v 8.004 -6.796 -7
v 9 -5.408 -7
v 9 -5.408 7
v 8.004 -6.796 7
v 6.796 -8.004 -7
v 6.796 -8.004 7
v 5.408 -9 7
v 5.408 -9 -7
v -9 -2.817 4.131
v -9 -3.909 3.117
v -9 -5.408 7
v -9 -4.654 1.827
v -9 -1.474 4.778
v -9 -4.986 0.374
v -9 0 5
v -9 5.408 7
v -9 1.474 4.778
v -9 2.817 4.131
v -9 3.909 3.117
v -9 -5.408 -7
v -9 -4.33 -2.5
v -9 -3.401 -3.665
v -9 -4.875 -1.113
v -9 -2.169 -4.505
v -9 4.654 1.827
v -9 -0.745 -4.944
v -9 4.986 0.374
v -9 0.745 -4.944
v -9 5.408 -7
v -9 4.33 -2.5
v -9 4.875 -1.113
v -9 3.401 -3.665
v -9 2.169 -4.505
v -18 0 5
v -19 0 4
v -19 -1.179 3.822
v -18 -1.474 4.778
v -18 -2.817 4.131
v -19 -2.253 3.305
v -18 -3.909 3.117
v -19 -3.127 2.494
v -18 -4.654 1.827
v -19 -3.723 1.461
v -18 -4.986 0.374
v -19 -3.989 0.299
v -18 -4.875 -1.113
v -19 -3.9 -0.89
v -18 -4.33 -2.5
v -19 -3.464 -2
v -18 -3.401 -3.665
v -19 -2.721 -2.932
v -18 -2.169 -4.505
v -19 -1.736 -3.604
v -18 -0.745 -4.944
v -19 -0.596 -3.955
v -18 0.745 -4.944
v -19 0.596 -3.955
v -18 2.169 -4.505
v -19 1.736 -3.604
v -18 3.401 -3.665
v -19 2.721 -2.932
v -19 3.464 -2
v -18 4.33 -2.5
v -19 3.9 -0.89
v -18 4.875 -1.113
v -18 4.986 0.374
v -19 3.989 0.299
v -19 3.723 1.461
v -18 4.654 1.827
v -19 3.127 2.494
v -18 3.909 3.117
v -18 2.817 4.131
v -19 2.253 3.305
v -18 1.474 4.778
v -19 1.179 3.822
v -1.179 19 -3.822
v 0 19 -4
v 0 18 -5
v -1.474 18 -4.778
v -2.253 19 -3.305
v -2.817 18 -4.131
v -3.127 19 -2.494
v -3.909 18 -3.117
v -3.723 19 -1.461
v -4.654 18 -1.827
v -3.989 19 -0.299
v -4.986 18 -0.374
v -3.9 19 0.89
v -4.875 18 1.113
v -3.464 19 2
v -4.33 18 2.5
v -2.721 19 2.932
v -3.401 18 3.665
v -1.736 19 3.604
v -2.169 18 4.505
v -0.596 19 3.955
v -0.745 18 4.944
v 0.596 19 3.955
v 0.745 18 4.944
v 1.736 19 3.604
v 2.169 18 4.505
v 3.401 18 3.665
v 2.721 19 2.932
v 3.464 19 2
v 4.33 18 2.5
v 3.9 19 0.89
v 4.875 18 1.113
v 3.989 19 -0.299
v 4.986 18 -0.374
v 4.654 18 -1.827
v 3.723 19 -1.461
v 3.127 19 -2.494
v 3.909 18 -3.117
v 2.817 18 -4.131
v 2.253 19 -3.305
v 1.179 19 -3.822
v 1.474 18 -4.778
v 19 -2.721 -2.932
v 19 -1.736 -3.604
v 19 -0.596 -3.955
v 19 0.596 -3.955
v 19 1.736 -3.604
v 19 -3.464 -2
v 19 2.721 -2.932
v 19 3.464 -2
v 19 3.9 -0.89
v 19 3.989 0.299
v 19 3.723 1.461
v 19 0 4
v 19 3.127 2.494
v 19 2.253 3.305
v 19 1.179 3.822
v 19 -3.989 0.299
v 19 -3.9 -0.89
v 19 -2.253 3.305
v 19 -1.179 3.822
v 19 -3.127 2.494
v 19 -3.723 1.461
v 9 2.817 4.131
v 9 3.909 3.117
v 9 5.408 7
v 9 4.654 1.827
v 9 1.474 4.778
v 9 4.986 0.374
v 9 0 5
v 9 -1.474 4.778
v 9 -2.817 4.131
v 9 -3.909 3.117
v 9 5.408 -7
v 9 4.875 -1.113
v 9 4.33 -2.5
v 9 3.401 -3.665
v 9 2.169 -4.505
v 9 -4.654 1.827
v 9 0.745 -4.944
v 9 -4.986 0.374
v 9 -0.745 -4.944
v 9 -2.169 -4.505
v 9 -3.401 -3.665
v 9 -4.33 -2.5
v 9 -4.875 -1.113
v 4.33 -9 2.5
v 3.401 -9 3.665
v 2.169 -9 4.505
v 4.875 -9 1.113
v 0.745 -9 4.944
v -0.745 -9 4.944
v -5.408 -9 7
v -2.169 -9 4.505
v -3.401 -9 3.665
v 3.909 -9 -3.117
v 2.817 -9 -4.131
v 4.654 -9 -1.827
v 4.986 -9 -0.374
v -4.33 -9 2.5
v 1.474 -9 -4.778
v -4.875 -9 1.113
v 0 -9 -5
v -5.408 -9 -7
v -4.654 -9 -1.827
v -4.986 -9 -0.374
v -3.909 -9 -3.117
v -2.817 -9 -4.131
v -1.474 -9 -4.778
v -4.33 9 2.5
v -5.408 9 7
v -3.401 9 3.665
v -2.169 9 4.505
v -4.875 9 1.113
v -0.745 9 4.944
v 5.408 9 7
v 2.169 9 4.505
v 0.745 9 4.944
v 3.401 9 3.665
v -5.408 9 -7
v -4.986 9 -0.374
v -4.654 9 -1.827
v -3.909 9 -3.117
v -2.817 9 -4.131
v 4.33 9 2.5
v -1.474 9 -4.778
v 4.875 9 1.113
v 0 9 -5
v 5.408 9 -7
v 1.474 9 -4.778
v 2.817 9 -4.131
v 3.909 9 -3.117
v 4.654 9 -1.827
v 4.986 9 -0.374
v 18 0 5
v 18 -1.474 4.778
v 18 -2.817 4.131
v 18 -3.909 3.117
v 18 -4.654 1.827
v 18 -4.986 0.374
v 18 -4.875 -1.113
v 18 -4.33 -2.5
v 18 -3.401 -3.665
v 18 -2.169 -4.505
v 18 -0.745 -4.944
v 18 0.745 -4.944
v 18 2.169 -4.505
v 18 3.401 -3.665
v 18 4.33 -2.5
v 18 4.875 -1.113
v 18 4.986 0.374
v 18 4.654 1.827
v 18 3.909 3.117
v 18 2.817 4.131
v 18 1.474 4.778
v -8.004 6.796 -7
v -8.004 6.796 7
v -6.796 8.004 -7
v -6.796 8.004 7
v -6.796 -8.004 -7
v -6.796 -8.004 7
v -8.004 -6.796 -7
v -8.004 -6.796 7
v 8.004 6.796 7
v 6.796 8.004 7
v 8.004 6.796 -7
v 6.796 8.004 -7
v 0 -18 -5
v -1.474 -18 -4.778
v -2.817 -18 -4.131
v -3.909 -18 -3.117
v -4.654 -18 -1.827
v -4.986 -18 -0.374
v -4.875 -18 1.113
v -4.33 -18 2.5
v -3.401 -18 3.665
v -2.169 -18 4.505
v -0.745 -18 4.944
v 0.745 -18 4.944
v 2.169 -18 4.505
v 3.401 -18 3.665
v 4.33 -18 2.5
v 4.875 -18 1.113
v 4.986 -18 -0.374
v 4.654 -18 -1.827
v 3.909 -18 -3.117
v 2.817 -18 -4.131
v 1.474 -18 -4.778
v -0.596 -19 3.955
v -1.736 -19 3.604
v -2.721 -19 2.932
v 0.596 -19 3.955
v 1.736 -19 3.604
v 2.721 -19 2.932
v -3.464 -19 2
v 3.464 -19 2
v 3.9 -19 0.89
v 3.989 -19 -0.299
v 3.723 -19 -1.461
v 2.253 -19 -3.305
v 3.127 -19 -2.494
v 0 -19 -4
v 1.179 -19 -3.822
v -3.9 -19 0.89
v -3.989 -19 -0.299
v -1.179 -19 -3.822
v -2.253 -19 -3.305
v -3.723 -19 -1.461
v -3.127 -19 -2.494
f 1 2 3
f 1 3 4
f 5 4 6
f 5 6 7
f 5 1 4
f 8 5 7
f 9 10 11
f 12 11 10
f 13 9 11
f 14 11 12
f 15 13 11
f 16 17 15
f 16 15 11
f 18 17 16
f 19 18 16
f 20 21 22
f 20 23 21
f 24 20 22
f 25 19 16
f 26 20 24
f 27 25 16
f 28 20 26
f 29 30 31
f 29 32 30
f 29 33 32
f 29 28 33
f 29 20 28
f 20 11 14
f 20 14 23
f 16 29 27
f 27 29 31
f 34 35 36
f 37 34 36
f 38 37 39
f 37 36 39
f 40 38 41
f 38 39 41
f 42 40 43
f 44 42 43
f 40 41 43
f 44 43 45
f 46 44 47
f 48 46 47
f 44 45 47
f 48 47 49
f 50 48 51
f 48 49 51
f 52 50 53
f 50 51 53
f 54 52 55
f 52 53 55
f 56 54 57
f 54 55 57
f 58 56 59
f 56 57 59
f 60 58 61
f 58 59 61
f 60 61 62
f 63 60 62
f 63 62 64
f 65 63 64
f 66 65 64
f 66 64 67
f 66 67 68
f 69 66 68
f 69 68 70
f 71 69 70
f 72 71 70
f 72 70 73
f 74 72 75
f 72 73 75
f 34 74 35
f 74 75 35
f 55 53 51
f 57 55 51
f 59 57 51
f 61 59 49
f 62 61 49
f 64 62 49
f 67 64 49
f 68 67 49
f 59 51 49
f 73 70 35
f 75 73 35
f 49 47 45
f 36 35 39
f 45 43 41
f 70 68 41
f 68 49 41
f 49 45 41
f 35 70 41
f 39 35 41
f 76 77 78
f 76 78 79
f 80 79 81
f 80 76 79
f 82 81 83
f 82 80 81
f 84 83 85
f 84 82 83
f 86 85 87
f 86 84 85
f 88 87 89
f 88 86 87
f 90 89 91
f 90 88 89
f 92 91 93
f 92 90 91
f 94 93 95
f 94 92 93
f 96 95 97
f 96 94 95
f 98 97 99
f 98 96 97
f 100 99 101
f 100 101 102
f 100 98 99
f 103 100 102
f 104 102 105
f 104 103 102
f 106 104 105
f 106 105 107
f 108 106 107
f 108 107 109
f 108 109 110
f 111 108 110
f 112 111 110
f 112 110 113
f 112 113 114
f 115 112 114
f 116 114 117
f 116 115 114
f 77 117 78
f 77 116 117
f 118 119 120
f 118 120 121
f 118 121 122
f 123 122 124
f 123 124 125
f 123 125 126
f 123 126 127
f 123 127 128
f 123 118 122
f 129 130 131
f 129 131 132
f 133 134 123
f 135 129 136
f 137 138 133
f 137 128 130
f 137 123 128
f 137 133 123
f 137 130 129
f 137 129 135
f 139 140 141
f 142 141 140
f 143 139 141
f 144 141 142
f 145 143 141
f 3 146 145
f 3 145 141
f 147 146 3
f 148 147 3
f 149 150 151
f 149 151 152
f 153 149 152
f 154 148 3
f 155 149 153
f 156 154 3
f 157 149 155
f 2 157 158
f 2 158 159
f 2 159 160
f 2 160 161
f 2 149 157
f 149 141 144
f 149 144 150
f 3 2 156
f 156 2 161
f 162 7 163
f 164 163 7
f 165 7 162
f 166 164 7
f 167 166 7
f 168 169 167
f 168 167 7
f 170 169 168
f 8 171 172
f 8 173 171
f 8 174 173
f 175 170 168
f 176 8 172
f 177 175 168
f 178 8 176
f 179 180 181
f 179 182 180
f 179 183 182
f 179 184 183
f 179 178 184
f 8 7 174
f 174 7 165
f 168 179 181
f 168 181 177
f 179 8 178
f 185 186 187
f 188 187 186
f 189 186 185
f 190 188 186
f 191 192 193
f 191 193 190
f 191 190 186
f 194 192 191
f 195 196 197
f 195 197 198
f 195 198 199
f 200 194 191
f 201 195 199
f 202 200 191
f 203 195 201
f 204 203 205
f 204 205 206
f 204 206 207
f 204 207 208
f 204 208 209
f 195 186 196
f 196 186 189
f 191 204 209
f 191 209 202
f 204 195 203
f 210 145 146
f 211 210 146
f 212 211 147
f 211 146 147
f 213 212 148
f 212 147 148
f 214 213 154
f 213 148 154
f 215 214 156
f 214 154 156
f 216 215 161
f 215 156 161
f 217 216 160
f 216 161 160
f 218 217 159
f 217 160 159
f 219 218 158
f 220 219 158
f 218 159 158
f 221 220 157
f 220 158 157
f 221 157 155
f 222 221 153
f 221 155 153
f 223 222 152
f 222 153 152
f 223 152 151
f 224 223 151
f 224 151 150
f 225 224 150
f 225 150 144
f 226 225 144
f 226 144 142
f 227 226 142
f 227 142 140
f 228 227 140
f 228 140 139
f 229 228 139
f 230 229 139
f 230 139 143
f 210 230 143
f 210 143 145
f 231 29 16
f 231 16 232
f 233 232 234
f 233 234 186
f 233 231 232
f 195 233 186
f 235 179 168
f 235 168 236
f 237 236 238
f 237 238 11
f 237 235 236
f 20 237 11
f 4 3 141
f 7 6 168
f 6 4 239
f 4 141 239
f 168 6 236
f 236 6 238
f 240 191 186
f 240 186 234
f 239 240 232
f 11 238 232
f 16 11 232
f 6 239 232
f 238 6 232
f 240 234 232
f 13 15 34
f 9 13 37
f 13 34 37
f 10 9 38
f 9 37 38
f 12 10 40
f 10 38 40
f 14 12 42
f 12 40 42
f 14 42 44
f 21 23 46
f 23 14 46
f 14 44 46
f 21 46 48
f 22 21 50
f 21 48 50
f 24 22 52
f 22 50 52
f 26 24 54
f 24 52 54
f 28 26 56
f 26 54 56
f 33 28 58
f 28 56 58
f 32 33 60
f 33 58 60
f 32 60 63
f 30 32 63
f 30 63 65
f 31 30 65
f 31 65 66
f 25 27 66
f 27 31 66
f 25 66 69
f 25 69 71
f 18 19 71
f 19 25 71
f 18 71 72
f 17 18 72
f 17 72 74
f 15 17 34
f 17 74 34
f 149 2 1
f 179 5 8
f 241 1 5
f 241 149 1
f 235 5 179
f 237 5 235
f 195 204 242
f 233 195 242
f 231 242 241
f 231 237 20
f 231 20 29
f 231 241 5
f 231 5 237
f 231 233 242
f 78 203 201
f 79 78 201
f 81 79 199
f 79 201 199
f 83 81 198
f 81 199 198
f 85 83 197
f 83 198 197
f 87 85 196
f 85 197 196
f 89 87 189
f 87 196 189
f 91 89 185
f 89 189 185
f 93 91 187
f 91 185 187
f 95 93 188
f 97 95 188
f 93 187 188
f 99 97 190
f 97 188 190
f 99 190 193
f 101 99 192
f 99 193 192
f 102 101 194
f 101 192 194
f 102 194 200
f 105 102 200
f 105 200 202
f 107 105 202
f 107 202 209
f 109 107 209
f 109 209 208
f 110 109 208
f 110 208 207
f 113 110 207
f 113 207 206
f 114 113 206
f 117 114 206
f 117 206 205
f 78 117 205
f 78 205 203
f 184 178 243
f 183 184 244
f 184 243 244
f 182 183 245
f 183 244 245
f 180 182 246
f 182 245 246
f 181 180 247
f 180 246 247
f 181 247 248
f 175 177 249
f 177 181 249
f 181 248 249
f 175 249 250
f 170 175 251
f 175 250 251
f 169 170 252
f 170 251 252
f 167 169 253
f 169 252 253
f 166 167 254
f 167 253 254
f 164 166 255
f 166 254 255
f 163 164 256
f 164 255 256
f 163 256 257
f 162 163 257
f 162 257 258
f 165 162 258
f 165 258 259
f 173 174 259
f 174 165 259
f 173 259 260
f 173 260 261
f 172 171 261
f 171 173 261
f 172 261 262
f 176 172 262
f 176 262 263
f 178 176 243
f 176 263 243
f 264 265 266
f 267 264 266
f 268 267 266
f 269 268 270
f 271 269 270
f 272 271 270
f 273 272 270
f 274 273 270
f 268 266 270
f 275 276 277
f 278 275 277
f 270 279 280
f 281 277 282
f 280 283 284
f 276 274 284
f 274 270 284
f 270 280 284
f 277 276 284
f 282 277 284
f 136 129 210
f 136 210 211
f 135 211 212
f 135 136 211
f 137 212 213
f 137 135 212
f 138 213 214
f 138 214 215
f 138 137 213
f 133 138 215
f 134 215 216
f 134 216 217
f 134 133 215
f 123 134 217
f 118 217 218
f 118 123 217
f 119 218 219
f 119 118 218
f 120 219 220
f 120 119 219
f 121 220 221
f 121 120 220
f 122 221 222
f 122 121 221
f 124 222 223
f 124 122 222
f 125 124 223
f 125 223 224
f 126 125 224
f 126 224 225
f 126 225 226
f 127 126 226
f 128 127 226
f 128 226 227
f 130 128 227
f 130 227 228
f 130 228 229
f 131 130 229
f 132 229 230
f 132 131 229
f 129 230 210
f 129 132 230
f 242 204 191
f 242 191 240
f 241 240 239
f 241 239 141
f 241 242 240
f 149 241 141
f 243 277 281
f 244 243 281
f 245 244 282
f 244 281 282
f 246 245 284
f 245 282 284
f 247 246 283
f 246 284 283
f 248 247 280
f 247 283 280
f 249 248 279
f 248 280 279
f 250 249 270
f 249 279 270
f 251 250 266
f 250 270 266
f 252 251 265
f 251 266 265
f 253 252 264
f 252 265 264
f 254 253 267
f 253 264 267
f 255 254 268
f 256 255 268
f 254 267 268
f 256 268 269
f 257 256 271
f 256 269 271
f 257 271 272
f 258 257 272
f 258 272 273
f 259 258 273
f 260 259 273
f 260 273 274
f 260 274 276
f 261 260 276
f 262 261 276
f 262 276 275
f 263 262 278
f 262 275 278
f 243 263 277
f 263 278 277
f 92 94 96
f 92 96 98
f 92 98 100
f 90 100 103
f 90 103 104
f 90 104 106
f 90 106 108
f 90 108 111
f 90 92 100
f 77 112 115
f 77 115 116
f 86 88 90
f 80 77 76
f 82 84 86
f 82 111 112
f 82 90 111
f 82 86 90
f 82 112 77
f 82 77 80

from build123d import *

# Parameters (mm, degrees)
BASE_EXTRUSION_DEPTH      = 7
BASE_EXTRUSION_DEPTH_BACK = 7
BOSS_EXTRU_4_DEPTH        = 19
BOSS_EXTRU_4_DEPTH_BACK   = 19
ESQUISSE8_R               = 5
BOSS_EXTRU_5_DEPTH        = 19
BOSS_EXTRU_5_DEPTH_BACK   = 19
ESQUISSE9_R               = 5
CHANFREIN2_SIZE           = 1


with BuildPart() as part:
    # Esquisse1 → Base-Extrusion (new, two sides: drawn at the far end of the back side and taken through both)
    with BuildSketch(Plane.XY.offset(-BASE_EXTRUSION_DEPTH_BACK)):
        with BuildLine():
            Line((-5.408326913, 9), (5.408326913, 9))
            ThreePointArc((5.408326913, 9), (7.424621202, 7.424621202), (9, 5.408326913))
            Line((9, 5.408326913), (9, -5.408326913))
            ThreePointArc((9, -5.408326913), (7.424621202, -7.424621202), (5.408326913, -9))
            Line((5.408326913, -9), (-5.408326913, -9))
            ThreePointArc((-5.408326913, -9), (-7.424621202, -7.424621202), (-9, -5.408326913))
            Line((-9, -5.408326913), (-9, 5.408326913))
            ThreePointArc((-9, 5.408326913), (-7.424621202, 7.424621202), (-5.408326913, 9))
        make_face()
    extrude(amount=BASE_EXTRUSION_DEPTH + BASE_EXTRUSION_DEPTH_BACK)

    # Esquisse8 → Boss.-Extru.4 (add, two sides: drawn at the far end of the back side and taken through both)
    with BuildSketch(Plane(origin=(0, 0, 0), x_dir=(1, 0, 0), z_dir=(0, 1, 0)).offset(-BOSS_EXTRU_4_DEPTH_BACK)):
        with Locations(Location((0, 0, 0), (0, 0, 90))):
            Circle(ESQUISSE8_R)
    extrude(amount=BOSS_EXTRU_4_DEPTH + BOSS_EXTRU_4_DEPTH_BACK)

    # Esquisse9 → Boss.-Extru.5 (add, two sides: drawn at the far end of the back side and taken through both)
    with BuildSketch(Plane(origin=(0, 0, 0), x_dir=(0, 0, -1), z_dir=(1, 0, 0)).offset(-BOSS_EXTRU_5_DEPTH_BACK)):
        with Locations(Location((0, 0, 0), (0, 0, 180))):
            Circle(ESQUISSE9_R)
    extrude(amount=BOSS_EXTRU_5_DEPTH + BOSS_EXTRU_5_DEPTH_BACK)

    # Chanfrein2
    chanfrein2_edges = [part.edges().sort_by_distance(p)[0] for p in [
        (0, 19, 5),
        (-19, 0, -5),
        (19, 0, -5),
        (0, -19, 5),
    ]]
    chamfer(chanfrein2_edges, length=CHANFREIN2_SIZE)


solid = part.part
